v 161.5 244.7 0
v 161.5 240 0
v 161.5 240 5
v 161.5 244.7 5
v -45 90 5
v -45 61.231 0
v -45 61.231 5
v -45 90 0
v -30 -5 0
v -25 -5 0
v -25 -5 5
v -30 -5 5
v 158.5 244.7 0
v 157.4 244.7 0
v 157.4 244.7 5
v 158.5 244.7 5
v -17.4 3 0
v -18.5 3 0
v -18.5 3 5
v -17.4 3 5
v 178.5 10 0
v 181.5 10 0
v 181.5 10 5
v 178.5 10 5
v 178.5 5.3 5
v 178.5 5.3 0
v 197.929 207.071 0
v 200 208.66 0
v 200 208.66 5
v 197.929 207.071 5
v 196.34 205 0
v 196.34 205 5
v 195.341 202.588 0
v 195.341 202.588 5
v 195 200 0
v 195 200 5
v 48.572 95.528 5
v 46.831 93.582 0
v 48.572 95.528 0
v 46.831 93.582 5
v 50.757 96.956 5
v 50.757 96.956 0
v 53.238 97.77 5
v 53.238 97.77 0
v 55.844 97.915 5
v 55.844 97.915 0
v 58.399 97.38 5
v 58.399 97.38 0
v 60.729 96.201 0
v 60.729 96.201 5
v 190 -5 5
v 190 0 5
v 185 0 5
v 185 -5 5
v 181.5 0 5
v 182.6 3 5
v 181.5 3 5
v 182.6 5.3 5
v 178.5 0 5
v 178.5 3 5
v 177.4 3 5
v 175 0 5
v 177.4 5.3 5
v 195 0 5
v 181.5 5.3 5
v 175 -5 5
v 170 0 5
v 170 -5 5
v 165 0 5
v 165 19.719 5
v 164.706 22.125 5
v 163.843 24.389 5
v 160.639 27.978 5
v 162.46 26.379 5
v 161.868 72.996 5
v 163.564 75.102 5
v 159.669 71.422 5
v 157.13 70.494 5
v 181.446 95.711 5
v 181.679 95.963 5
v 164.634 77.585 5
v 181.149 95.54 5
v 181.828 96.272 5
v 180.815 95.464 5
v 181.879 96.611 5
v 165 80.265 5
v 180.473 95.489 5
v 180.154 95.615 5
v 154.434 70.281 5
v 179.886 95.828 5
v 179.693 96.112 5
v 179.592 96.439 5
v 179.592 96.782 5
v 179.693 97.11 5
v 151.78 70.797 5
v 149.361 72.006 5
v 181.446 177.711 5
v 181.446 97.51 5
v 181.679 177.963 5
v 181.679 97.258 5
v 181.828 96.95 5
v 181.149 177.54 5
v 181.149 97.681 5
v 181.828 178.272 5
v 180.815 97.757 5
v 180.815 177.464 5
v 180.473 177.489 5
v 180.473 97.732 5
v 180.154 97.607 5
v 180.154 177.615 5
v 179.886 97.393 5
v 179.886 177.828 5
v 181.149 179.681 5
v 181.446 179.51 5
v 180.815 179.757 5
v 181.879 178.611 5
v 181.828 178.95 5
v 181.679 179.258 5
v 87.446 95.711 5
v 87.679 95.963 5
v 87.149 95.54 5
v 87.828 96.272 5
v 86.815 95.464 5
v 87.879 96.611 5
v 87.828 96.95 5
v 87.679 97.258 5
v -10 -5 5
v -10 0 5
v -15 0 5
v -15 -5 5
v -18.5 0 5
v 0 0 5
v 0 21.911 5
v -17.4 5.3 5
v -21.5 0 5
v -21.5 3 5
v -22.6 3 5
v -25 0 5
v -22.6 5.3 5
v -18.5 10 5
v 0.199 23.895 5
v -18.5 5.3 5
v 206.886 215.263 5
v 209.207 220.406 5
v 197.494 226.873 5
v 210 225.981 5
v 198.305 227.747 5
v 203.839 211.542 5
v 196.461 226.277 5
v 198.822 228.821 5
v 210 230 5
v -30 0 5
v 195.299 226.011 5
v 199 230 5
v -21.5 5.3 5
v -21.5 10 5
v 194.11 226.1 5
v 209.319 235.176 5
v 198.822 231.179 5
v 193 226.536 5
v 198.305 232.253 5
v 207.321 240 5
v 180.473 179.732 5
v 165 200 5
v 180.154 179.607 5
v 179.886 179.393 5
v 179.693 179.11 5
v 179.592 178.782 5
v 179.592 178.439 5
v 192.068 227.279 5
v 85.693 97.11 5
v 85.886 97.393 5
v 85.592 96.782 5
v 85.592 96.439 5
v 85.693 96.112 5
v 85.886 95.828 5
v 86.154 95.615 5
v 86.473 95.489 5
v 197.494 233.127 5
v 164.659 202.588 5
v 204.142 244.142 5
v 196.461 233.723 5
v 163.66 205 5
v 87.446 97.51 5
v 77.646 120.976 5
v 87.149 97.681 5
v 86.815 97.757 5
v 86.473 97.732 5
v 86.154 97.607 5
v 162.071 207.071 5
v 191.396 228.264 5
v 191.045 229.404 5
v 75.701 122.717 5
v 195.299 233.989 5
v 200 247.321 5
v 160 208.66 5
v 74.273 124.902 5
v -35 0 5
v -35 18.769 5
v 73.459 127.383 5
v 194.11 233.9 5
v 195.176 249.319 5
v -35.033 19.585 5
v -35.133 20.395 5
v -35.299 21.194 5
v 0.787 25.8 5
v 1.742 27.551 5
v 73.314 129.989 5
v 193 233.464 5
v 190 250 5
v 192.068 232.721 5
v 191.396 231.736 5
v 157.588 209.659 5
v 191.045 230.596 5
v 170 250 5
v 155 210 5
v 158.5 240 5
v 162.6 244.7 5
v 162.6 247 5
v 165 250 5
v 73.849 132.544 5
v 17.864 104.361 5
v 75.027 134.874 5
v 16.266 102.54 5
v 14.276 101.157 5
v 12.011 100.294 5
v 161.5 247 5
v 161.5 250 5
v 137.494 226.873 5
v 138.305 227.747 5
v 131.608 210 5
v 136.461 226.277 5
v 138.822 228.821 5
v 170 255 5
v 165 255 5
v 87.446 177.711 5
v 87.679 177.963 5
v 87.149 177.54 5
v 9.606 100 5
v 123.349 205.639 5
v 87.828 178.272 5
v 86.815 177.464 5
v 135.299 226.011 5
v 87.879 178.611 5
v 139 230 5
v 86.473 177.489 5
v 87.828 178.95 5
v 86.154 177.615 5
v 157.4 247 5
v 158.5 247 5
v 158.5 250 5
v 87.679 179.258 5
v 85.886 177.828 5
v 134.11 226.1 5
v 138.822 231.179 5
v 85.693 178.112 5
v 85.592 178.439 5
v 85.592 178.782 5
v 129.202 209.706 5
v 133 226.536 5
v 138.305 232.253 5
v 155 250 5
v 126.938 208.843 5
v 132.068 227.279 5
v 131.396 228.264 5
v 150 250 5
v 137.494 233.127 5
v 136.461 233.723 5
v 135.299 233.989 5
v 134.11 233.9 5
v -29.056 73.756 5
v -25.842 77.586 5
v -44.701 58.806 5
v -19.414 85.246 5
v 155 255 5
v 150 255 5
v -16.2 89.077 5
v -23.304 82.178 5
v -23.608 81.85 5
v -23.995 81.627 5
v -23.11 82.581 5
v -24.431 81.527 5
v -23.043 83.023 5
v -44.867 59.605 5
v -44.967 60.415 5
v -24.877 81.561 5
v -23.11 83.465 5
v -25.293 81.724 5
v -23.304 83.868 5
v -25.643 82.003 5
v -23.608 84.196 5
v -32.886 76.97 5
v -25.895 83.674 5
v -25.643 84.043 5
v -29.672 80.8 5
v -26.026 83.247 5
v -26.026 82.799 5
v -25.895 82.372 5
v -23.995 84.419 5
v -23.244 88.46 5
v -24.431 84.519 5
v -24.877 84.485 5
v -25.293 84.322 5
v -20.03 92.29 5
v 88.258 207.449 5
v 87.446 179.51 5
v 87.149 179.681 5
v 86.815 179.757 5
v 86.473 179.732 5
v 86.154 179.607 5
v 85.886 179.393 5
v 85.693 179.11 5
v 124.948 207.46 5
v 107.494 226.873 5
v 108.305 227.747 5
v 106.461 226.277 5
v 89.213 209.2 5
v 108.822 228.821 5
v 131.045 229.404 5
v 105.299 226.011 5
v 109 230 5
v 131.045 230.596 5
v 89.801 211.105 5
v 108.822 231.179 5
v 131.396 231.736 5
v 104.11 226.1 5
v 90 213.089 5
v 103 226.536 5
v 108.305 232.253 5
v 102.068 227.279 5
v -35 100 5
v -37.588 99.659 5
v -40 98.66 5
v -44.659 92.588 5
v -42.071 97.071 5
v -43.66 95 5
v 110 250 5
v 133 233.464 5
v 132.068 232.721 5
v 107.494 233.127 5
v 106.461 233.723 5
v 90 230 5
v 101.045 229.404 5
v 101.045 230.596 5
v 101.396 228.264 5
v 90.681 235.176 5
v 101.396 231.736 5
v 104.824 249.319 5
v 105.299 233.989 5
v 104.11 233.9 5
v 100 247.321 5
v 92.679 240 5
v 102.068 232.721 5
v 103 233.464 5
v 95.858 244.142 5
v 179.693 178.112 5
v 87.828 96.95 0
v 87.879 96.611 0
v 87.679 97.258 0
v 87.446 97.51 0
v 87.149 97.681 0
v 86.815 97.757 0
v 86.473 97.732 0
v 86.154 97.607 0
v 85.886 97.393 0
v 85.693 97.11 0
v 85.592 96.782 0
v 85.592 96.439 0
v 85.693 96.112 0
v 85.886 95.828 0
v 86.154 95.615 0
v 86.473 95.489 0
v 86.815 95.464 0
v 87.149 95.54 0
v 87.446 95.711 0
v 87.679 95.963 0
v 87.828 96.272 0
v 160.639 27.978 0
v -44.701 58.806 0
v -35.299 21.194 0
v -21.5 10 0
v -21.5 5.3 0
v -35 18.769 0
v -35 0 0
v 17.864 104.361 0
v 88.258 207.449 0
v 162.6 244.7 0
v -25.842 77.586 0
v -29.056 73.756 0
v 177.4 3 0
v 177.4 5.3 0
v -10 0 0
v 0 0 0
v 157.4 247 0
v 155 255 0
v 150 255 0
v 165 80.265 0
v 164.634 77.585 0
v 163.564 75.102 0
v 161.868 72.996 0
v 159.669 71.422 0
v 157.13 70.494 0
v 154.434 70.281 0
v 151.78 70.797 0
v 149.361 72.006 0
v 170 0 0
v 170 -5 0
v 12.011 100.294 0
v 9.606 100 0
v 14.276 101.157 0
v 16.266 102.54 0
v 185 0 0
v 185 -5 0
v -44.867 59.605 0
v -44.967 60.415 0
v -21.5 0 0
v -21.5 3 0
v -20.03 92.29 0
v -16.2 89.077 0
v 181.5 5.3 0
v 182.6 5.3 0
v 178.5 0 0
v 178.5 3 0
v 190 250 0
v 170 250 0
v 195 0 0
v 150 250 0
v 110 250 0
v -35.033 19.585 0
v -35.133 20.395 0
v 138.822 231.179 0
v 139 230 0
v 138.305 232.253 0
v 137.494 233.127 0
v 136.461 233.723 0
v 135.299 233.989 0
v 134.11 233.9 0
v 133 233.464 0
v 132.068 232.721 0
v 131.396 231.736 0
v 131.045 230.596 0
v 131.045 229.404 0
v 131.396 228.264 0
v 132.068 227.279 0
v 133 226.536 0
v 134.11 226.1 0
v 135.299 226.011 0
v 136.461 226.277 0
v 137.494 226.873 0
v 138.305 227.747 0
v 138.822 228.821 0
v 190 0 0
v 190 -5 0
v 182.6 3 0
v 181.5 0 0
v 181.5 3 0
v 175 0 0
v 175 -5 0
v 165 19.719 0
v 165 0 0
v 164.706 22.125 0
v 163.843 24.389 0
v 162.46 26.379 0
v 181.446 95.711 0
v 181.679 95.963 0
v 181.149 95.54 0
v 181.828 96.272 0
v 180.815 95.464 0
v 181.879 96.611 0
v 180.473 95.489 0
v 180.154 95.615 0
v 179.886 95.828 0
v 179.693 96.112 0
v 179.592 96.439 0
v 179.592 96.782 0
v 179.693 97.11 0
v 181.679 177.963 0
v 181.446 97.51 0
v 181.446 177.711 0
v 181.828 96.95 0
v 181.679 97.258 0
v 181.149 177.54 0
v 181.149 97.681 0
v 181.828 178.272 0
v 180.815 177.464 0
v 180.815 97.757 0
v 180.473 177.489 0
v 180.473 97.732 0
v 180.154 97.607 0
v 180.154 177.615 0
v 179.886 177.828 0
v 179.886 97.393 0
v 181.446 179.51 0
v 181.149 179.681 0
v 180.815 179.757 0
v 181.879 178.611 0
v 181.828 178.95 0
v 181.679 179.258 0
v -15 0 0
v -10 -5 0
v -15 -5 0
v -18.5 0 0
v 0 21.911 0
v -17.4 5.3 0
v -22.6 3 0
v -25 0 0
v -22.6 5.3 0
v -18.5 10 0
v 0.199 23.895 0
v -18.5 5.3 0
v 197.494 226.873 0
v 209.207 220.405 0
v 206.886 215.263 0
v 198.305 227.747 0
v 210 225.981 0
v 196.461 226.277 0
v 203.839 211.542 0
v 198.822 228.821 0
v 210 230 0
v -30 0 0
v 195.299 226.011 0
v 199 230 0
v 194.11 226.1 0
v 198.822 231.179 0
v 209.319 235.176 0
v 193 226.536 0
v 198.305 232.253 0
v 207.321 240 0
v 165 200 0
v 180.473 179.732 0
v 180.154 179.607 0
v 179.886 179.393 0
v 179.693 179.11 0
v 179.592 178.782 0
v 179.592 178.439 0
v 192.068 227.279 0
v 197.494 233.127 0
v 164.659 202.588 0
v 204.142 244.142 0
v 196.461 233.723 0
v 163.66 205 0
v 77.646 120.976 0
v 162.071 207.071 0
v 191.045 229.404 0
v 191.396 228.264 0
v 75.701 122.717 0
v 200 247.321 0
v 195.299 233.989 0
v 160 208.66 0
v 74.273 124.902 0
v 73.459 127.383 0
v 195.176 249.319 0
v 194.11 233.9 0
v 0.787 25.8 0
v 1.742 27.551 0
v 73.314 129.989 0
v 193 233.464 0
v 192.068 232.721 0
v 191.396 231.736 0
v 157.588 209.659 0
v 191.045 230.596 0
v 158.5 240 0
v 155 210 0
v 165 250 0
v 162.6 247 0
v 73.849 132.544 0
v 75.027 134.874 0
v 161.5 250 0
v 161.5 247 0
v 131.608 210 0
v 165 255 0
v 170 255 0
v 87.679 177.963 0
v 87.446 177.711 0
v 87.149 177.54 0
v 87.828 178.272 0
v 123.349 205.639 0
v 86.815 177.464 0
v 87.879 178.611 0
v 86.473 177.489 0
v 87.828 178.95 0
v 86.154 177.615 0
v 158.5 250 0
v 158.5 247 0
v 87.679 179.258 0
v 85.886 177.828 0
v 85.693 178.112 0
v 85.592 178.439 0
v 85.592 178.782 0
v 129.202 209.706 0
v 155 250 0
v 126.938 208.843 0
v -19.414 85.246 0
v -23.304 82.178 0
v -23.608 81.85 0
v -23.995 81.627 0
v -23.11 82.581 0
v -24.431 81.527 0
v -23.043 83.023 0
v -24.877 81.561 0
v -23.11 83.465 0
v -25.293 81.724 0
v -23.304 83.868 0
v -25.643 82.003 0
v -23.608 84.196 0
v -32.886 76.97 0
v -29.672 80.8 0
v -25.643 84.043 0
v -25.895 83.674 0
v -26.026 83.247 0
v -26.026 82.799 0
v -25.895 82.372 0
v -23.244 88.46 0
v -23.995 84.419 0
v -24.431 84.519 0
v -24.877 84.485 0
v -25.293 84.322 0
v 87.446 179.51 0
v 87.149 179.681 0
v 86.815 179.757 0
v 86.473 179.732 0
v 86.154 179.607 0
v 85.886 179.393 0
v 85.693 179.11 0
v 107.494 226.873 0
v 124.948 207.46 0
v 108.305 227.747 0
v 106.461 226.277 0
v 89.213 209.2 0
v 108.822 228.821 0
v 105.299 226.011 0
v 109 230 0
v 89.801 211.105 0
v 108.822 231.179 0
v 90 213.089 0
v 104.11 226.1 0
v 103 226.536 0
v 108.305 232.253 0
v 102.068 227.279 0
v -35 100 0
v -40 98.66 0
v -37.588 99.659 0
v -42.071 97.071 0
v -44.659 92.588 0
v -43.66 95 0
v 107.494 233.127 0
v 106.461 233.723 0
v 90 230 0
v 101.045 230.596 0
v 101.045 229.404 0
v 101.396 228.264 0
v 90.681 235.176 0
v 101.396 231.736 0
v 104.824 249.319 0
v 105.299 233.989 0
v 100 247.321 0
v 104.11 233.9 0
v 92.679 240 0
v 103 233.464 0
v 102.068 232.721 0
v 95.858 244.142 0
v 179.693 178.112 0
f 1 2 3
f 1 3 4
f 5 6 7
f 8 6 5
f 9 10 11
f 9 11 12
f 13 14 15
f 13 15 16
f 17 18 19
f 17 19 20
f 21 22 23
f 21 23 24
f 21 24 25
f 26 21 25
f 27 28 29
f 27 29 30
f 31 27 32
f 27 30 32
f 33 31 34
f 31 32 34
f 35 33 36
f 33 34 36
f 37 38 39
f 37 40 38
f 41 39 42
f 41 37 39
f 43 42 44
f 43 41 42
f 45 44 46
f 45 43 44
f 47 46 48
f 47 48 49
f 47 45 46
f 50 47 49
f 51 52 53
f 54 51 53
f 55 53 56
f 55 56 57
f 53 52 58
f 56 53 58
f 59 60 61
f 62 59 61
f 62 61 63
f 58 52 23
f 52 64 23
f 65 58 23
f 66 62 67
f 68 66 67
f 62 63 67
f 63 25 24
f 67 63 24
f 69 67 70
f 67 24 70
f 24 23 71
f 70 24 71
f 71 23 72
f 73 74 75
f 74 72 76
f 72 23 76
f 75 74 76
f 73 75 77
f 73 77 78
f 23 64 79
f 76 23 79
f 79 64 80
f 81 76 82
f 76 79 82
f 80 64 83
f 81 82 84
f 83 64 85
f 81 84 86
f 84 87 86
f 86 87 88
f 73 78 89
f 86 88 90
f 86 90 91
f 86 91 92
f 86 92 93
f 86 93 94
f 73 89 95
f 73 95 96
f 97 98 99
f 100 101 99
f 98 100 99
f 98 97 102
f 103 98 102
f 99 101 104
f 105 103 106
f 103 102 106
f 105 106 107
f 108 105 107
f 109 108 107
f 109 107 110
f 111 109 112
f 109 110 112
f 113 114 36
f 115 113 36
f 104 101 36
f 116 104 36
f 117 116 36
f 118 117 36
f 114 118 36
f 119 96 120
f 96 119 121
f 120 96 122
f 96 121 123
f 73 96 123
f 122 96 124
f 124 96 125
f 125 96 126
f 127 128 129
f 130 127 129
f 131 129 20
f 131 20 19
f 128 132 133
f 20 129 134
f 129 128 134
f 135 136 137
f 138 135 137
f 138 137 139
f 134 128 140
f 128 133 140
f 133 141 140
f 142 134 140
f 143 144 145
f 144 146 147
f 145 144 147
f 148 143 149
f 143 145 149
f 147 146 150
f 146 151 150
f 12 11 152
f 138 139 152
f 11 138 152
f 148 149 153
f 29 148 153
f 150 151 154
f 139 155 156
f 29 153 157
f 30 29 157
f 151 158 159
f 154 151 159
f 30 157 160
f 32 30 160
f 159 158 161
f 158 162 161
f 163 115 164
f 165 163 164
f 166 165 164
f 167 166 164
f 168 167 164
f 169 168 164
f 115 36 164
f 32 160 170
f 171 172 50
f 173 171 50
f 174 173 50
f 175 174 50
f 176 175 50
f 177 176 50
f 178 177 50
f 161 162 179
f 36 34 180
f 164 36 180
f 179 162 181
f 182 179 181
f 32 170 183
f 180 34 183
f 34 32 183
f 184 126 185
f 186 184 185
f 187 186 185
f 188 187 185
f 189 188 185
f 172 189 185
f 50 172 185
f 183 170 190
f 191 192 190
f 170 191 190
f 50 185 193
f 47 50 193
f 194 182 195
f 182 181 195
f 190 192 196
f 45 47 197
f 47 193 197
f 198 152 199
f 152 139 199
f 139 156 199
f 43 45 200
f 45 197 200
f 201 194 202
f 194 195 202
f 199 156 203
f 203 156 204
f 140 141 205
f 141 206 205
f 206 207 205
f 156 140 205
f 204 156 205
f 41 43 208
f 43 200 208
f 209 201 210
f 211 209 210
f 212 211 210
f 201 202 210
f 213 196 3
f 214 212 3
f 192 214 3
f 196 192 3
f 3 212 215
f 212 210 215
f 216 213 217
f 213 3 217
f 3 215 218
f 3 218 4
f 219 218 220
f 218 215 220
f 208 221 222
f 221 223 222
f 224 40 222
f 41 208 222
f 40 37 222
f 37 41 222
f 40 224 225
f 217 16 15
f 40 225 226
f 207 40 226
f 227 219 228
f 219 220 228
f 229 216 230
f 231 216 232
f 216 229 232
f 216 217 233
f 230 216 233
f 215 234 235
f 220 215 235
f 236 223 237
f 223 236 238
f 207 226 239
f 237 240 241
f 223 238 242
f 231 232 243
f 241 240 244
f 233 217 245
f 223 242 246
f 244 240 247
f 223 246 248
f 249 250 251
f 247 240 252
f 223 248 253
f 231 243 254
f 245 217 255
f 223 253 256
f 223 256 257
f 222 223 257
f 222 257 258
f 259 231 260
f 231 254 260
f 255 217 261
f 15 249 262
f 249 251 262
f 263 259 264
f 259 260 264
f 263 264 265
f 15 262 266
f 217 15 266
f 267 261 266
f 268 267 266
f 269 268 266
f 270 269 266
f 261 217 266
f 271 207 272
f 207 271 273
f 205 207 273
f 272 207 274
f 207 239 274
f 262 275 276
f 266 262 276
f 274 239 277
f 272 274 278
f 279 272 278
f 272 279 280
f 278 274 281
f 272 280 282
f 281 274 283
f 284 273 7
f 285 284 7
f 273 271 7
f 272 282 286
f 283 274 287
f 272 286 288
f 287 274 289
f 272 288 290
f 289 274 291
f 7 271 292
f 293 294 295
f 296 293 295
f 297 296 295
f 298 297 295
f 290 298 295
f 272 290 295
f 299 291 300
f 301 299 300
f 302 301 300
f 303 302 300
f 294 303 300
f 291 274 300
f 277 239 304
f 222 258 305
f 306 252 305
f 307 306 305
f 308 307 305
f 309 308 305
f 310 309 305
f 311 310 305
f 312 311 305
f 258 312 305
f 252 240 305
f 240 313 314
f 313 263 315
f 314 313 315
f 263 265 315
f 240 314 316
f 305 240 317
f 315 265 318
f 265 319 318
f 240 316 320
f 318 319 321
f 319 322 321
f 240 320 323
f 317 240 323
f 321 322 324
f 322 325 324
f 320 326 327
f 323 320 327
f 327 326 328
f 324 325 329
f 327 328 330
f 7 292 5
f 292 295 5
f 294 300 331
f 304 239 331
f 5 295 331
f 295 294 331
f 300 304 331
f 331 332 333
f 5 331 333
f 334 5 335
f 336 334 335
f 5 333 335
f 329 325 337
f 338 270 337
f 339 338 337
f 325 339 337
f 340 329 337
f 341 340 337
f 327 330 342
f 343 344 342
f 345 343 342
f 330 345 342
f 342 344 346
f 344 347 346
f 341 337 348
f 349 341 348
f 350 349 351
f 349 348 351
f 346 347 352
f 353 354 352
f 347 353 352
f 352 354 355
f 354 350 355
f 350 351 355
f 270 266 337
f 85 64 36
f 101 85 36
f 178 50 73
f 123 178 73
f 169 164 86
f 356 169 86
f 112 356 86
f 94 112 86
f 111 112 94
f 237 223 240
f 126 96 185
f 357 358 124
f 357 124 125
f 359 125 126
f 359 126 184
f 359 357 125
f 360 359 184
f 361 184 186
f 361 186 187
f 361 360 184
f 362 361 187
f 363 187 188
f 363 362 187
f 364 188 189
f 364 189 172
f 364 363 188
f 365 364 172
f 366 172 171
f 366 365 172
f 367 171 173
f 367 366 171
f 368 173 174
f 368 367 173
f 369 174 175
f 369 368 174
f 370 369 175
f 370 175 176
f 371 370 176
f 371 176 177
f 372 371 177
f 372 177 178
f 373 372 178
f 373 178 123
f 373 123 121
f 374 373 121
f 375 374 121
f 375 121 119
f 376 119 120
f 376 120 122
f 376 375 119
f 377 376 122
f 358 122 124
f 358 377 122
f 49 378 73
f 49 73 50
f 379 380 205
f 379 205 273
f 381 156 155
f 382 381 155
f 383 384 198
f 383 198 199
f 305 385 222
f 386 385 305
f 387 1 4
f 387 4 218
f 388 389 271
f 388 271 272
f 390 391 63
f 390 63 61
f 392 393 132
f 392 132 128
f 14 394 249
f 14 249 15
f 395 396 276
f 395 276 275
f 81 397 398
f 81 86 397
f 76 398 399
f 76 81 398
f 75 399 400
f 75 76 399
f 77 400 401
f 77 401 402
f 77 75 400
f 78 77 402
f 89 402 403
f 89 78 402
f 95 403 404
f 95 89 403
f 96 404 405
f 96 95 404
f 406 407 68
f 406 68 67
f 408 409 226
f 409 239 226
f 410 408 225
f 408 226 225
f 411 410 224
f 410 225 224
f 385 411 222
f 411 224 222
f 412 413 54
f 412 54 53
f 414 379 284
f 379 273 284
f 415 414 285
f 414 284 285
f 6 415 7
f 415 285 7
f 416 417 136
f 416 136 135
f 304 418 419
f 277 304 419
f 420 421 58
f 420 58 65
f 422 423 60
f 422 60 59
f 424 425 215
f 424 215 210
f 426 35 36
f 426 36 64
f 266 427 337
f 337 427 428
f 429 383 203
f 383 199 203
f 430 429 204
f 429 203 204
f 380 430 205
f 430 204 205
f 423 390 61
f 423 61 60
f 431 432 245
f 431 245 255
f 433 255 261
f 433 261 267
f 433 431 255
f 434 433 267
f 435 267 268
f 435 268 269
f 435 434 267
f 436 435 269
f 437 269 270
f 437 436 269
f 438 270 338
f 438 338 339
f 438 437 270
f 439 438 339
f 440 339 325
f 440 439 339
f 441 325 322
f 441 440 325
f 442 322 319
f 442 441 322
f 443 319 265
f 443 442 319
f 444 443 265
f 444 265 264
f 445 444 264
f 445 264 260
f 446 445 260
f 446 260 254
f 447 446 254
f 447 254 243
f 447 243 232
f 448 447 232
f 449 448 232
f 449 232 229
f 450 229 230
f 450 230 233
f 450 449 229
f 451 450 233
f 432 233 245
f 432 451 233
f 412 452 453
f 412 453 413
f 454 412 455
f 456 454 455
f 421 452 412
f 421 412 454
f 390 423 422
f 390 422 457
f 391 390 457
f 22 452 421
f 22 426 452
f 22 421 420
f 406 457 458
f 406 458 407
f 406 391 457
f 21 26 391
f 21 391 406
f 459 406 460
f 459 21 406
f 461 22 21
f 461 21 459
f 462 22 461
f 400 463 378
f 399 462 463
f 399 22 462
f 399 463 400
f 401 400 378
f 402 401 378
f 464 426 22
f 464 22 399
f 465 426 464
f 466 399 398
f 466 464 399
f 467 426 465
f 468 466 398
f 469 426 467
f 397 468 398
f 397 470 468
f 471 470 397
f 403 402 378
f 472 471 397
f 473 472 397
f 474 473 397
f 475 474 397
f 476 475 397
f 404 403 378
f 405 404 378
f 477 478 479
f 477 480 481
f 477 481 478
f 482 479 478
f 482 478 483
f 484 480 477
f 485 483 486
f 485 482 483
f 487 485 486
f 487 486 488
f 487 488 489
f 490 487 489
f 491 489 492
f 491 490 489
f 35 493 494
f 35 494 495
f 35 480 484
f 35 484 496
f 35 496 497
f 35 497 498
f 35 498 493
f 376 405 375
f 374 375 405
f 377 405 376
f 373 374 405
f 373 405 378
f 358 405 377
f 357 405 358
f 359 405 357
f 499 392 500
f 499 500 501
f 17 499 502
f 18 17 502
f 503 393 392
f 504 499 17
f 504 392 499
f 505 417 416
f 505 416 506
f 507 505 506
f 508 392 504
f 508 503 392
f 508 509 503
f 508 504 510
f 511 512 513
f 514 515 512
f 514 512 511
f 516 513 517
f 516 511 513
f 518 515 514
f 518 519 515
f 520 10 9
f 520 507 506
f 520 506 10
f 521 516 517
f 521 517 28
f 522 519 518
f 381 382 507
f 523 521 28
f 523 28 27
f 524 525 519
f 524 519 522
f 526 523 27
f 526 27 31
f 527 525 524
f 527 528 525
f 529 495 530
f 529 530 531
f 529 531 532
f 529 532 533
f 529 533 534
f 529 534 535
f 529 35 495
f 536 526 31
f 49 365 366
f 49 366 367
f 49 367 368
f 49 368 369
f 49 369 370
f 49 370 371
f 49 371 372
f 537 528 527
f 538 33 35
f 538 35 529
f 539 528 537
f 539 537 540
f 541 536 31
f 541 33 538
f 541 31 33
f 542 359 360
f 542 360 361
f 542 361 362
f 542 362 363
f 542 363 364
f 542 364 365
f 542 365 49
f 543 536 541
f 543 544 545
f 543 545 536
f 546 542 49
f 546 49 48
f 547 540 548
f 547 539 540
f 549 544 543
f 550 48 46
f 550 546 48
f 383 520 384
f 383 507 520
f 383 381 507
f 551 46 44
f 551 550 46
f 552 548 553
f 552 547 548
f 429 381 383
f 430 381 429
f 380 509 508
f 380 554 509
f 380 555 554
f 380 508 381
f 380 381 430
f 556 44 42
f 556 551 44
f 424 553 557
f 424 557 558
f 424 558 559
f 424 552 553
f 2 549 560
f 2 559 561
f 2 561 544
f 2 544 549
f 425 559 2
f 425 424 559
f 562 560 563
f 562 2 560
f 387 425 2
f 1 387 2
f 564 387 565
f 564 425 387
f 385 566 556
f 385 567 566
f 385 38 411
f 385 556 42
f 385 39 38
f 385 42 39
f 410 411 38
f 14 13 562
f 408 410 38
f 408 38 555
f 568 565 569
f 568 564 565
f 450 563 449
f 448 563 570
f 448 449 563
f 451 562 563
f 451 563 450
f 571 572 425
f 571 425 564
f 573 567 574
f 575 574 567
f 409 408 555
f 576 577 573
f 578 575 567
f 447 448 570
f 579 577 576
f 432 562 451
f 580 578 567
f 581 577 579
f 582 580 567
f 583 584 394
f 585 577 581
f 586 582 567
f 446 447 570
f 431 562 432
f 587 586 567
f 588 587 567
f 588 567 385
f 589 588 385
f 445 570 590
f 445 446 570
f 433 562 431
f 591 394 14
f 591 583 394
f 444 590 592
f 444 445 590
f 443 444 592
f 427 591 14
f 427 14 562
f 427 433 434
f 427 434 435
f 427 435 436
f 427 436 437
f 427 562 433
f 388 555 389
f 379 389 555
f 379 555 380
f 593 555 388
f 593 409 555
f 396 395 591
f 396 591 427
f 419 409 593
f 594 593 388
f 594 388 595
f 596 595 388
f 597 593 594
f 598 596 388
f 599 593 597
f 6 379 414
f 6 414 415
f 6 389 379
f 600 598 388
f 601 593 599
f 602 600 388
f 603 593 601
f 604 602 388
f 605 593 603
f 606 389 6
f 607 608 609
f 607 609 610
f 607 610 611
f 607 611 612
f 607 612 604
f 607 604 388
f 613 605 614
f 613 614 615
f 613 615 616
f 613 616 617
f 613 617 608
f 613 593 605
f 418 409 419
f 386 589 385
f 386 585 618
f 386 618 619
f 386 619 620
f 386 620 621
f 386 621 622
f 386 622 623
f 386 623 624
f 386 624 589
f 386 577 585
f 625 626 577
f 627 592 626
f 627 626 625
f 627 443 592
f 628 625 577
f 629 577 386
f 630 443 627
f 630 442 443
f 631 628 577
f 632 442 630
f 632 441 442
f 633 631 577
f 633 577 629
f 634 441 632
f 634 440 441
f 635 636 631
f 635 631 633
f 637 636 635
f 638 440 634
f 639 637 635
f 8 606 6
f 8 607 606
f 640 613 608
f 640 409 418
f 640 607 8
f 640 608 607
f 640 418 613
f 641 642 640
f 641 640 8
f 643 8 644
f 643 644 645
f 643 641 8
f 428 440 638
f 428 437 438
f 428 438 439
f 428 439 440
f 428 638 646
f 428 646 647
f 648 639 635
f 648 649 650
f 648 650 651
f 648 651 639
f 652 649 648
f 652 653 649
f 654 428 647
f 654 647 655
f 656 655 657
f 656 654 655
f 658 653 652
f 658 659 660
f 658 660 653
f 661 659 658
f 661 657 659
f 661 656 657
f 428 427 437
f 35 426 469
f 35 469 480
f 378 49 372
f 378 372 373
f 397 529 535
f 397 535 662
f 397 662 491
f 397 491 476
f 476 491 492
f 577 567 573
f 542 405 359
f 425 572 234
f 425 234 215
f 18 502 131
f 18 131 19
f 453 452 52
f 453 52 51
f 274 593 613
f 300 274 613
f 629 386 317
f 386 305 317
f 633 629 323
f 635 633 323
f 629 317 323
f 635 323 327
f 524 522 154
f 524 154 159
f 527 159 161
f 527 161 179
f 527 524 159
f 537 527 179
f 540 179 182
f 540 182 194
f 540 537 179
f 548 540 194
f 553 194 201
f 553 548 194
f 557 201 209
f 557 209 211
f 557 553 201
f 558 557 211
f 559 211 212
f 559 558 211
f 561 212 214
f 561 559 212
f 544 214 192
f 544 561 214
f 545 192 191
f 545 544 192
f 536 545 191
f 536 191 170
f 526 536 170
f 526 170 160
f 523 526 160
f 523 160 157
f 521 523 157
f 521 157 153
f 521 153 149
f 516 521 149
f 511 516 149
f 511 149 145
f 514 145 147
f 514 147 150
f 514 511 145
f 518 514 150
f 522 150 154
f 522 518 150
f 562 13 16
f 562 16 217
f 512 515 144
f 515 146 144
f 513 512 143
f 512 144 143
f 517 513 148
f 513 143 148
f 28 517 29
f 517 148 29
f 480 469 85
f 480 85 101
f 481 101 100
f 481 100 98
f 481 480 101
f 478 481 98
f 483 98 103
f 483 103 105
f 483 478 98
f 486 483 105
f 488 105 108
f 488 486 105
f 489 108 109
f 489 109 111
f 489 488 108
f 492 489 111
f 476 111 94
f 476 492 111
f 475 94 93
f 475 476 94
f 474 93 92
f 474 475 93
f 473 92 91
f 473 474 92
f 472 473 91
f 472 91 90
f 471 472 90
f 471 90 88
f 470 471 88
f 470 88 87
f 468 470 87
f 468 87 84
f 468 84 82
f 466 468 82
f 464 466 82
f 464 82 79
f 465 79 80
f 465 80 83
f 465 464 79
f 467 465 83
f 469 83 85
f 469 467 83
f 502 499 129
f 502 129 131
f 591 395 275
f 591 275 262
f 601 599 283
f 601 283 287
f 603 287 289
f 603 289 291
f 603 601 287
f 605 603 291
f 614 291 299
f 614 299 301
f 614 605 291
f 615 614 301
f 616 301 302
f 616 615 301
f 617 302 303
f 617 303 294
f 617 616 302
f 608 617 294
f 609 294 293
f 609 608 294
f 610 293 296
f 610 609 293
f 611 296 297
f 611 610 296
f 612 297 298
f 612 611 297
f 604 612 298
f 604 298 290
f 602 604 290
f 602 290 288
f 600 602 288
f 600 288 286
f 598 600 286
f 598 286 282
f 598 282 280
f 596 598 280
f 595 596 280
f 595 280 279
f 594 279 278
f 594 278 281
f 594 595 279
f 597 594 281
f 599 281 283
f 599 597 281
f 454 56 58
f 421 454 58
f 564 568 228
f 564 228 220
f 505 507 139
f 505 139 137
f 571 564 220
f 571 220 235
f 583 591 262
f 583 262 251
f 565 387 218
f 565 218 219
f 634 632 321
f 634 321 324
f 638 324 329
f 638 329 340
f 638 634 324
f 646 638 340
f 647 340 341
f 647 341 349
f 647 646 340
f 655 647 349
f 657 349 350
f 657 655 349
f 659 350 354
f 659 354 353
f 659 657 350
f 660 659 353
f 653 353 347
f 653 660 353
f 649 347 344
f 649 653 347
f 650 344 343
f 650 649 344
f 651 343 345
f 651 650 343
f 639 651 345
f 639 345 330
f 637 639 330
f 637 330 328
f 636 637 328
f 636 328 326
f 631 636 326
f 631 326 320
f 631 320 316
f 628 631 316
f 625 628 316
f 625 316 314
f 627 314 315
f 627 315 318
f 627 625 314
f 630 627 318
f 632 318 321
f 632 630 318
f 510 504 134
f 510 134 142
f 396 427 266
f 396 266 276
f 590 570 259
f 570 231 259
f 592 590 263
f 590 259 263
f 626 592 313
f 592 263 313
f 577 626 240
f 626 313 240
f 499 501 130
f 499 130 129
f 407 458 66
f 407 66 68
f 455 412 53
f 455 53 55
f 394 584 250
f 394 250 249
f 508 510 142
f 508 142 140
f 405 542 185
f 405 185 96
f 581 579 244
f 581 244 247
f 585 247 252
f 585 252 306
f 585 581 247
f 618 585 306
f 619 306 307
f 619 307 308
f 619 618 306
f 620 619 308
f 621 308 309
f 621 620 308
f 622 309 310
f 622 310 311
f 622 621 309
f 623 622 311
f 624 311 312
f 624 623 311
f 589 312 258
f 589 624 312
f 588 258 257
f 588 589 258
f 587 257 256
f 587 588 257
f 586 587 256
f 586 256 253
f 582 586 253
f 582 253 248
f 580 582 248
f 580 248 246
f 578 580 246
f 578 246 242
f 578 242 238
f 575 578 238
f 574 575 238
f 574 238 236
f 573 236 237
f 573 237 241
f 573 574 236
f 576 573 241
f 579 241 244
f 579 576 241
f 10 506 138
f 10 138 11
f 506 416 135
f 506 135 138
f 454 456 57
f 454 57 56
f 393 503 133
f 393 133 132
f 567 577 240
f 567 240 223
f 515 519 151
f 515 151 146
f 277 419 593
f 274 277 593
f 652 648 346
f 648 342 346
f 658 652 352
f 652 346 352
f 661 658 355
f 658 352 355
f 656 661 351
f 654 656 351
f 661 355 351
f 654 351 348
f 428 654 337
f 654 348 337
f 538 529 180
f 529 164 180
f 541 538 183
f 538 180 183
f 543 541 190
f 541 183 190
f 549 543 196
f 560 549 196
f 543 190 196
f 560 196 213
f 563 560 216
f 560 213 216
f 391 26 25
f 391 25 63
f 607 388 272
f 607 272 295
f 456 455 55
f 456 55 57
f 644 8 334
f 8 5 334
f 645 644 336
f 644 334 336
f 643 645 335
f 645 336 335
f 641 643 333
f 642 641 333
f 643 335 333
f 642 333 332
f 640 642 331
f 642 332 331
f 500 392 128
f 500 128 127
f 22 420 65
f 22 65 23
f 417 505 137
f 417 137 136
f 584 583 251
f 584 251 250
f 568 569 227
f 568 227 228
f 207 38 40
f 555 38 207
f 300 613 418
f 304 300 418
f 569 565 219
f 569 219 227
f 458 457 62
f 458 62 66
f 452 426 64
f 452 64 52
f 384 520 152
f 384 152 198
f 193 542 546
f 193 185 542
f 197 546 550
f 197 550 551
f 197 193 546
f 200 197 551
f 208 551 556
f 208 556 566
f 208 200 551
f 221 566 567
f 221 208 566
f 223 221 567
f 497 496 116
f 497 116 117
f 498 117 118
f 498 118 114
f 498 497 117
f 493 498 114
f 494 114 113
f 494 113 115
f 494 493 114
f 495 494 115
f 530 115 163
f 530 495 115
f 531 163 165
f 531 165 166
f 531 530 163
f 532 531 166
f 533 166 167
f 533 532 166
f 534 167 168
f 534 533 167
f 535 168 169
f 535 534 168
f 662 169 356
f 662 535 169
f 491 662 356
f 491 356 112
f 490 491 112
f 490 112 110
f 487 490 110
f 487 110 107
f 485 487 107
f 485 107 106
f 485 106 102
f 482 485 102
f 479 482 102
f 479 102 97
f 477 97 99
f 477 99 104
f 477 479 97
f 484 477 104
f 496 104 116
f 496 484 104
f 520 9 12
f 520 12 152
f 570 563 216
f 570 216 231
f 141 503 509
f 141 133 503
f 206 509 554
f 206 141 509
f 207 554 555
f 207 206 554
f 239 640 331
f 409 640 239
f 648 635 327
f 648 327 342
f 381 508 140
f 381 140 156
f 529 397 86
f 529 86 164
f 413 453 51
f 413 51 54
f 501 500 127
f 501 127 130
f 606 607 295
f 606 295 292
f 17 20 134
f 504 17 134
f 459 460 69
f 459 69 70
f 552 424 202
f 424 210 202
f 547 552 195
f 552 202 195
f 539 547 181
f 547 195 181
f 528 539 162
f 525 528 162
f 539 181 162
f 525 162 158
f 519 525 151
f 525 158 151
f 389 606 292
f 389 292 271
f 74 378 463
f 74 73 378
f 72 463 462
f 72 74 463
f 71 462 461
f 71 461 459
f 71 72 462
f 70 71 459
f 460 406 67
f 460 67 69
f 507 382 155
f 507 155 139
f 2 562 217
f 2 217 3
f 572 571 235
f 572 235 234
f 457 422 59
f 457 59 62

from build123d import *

# Parameters (mm, degrees)
ESQUISSE1_R        = 4
ESQUISSE1_R_2      = 1.15
ESQUISSE1_R_3      = 1.5
BOSS_EXTRU_1_DEPTH = 5
CONG_1_R           = 10
CONG_2_R           = 20


with BuildPart() as part:
    # Esquisse1 → Boss.-Extru.1 (new body)
    with BuildSketch(Plane.XY):
        Polygon((-21.5, 0), (-25, 0), (-25, -5), (-30, -5), (-30, 0), (-35, 0), (-35, 20), (-45, 60), (-45, 100), (14.886620542, 100), (90, 210), (90, 250), (117.313956166, 250), (150, 250), (150, 255), (155, 255), (155, 250), (158.5, 250), (158.5, 247), (157.4, 247), (157.4, 244.7), (158.5, 244.7), (158.5, 240), (161.5, 240), (161.5, 244.7), (162.6, 244.7), (162.6, 247), (161.5, 247), (161.5, 250), (165, 250), (165, 255), (170, 255), (170, 250), (210, 250), (210, 210), (195, 210), (195, 0), (190, 0), (190, -5), (185, -5), (185, 0), (181.5, 0), (181.5, 3), (182.6, 3), (182.6, 5.3), (181.5, 5.3), (181.5, 10), (178.5, 10), (178.5, 5.3), (177.4, 5.3), (177.4, 3), (178.5, 3), (178.5, 0), (175, 0), (175, -5), (170, -5), (170, 0), (165, 0), (165, 25), (52.470534613, 101.840622125), (0, 25), (0, 0), (-10, 0), (-10, -5), (-15, -5), (-15, 0), (-18.5, 0), (-18.5, 3), (-17.4, 3), (-17.4, 5.3), (-18.5, 5.3), (-18.5, 10), (-21.5, 10), (-21.5, 5.3), (-22.6, 5.3), (-22.6, 3), (-21.5, 3), align=None)
        with Locations((135, 230)):
            Circle(ESQUISSE1_R, mode=Mode.SUBTRACT)
        with Locations((195, 230)):
            Circle(ESQUISSE1_R, mode=Mode.SUBTRACT)
        with Locations((105, 230)):
            Circle(ESQUISSE1_R, mode=Mode.SUBTRACT)
        with Locations((86.729297438, 178.610587107)):
            Circle(ESQUISSE1_R_2, mode=Mode.SUBTRACT)
        with Locations((180.729297438, 96.610587107)):
            Circle(ESQUISSE1_R_2, mode=Mode.SUBTRACT)
        with Locations((86.729297438, 96.610587107)):
            Circle(ESQUISSE1_R_2, mode=Mode.SUBTRACT)
        with Locations((180.729297438, 178.610587107)):
            Circle(ESQUISSE1_R_2, mode=Mode.SUBTRACT)
        with Locations((-24.543125869, 83.023041686)):
            Circle(ESQUISSE1_R_3, mode=Mode.SUBTRACT)
        Polygon((165, 210), (126.32704727, 210), (69.388067414, 126.61555066), (165, 61.32704727), align=None, mode=Mode.SUBTRACT)
        Polygon((-29.672175025, 80.799788495), (-32.886113073, 76.969566279), (-29.055890858, 73.755628231), (-25.841952809, 77.585850447), align=None, mode=Mode.SUBTRACT)
        Polygon((-23.244298928, 88.460232926), (-20.03036088, 92.290455142), (-16.200138664, 89.076517093), (-19.414076712, 85.246294878), align=None, mode=Mode.SUBTRACT)
    extrude(amount=BOSS_EXTRU_1_DEPTH)

    # Congé1
    cong_1_edges = [part.edges().sort_by_distance(p)[0] for p in [
        (-35, 20, 2.5),
        (-45, 60, 2.5),
        (-45, 100, 2.5),
        (14.886620542, 100, 2.5),
        (90, 210, 2.5),
        (195, 210, 2.5),
        (165, 25, 2.5),
        (52.470534613, 101.840622125, 2.5),
        (0, 25, 2.5),
        (126.32704727, 210, 2.5),
        (69.388067414, 126.61555066, 2.5),
        (165, 61.32704727, 2.5),
        (165, 210, 2.5),
    ]]
    fillet(cong_1_edges, radius=CONG_1_R)

    # Congé2
    cong_2_edges = [part.edges().sort_by_distance(p)[0] for p in [
        (90, 250, 2.5),
        (210, 250, 2.5),
        (210, 210, 2.5),
    ]]
    fillet(cong_2_edges, radius=CONG_2_R)


solid = part.part
